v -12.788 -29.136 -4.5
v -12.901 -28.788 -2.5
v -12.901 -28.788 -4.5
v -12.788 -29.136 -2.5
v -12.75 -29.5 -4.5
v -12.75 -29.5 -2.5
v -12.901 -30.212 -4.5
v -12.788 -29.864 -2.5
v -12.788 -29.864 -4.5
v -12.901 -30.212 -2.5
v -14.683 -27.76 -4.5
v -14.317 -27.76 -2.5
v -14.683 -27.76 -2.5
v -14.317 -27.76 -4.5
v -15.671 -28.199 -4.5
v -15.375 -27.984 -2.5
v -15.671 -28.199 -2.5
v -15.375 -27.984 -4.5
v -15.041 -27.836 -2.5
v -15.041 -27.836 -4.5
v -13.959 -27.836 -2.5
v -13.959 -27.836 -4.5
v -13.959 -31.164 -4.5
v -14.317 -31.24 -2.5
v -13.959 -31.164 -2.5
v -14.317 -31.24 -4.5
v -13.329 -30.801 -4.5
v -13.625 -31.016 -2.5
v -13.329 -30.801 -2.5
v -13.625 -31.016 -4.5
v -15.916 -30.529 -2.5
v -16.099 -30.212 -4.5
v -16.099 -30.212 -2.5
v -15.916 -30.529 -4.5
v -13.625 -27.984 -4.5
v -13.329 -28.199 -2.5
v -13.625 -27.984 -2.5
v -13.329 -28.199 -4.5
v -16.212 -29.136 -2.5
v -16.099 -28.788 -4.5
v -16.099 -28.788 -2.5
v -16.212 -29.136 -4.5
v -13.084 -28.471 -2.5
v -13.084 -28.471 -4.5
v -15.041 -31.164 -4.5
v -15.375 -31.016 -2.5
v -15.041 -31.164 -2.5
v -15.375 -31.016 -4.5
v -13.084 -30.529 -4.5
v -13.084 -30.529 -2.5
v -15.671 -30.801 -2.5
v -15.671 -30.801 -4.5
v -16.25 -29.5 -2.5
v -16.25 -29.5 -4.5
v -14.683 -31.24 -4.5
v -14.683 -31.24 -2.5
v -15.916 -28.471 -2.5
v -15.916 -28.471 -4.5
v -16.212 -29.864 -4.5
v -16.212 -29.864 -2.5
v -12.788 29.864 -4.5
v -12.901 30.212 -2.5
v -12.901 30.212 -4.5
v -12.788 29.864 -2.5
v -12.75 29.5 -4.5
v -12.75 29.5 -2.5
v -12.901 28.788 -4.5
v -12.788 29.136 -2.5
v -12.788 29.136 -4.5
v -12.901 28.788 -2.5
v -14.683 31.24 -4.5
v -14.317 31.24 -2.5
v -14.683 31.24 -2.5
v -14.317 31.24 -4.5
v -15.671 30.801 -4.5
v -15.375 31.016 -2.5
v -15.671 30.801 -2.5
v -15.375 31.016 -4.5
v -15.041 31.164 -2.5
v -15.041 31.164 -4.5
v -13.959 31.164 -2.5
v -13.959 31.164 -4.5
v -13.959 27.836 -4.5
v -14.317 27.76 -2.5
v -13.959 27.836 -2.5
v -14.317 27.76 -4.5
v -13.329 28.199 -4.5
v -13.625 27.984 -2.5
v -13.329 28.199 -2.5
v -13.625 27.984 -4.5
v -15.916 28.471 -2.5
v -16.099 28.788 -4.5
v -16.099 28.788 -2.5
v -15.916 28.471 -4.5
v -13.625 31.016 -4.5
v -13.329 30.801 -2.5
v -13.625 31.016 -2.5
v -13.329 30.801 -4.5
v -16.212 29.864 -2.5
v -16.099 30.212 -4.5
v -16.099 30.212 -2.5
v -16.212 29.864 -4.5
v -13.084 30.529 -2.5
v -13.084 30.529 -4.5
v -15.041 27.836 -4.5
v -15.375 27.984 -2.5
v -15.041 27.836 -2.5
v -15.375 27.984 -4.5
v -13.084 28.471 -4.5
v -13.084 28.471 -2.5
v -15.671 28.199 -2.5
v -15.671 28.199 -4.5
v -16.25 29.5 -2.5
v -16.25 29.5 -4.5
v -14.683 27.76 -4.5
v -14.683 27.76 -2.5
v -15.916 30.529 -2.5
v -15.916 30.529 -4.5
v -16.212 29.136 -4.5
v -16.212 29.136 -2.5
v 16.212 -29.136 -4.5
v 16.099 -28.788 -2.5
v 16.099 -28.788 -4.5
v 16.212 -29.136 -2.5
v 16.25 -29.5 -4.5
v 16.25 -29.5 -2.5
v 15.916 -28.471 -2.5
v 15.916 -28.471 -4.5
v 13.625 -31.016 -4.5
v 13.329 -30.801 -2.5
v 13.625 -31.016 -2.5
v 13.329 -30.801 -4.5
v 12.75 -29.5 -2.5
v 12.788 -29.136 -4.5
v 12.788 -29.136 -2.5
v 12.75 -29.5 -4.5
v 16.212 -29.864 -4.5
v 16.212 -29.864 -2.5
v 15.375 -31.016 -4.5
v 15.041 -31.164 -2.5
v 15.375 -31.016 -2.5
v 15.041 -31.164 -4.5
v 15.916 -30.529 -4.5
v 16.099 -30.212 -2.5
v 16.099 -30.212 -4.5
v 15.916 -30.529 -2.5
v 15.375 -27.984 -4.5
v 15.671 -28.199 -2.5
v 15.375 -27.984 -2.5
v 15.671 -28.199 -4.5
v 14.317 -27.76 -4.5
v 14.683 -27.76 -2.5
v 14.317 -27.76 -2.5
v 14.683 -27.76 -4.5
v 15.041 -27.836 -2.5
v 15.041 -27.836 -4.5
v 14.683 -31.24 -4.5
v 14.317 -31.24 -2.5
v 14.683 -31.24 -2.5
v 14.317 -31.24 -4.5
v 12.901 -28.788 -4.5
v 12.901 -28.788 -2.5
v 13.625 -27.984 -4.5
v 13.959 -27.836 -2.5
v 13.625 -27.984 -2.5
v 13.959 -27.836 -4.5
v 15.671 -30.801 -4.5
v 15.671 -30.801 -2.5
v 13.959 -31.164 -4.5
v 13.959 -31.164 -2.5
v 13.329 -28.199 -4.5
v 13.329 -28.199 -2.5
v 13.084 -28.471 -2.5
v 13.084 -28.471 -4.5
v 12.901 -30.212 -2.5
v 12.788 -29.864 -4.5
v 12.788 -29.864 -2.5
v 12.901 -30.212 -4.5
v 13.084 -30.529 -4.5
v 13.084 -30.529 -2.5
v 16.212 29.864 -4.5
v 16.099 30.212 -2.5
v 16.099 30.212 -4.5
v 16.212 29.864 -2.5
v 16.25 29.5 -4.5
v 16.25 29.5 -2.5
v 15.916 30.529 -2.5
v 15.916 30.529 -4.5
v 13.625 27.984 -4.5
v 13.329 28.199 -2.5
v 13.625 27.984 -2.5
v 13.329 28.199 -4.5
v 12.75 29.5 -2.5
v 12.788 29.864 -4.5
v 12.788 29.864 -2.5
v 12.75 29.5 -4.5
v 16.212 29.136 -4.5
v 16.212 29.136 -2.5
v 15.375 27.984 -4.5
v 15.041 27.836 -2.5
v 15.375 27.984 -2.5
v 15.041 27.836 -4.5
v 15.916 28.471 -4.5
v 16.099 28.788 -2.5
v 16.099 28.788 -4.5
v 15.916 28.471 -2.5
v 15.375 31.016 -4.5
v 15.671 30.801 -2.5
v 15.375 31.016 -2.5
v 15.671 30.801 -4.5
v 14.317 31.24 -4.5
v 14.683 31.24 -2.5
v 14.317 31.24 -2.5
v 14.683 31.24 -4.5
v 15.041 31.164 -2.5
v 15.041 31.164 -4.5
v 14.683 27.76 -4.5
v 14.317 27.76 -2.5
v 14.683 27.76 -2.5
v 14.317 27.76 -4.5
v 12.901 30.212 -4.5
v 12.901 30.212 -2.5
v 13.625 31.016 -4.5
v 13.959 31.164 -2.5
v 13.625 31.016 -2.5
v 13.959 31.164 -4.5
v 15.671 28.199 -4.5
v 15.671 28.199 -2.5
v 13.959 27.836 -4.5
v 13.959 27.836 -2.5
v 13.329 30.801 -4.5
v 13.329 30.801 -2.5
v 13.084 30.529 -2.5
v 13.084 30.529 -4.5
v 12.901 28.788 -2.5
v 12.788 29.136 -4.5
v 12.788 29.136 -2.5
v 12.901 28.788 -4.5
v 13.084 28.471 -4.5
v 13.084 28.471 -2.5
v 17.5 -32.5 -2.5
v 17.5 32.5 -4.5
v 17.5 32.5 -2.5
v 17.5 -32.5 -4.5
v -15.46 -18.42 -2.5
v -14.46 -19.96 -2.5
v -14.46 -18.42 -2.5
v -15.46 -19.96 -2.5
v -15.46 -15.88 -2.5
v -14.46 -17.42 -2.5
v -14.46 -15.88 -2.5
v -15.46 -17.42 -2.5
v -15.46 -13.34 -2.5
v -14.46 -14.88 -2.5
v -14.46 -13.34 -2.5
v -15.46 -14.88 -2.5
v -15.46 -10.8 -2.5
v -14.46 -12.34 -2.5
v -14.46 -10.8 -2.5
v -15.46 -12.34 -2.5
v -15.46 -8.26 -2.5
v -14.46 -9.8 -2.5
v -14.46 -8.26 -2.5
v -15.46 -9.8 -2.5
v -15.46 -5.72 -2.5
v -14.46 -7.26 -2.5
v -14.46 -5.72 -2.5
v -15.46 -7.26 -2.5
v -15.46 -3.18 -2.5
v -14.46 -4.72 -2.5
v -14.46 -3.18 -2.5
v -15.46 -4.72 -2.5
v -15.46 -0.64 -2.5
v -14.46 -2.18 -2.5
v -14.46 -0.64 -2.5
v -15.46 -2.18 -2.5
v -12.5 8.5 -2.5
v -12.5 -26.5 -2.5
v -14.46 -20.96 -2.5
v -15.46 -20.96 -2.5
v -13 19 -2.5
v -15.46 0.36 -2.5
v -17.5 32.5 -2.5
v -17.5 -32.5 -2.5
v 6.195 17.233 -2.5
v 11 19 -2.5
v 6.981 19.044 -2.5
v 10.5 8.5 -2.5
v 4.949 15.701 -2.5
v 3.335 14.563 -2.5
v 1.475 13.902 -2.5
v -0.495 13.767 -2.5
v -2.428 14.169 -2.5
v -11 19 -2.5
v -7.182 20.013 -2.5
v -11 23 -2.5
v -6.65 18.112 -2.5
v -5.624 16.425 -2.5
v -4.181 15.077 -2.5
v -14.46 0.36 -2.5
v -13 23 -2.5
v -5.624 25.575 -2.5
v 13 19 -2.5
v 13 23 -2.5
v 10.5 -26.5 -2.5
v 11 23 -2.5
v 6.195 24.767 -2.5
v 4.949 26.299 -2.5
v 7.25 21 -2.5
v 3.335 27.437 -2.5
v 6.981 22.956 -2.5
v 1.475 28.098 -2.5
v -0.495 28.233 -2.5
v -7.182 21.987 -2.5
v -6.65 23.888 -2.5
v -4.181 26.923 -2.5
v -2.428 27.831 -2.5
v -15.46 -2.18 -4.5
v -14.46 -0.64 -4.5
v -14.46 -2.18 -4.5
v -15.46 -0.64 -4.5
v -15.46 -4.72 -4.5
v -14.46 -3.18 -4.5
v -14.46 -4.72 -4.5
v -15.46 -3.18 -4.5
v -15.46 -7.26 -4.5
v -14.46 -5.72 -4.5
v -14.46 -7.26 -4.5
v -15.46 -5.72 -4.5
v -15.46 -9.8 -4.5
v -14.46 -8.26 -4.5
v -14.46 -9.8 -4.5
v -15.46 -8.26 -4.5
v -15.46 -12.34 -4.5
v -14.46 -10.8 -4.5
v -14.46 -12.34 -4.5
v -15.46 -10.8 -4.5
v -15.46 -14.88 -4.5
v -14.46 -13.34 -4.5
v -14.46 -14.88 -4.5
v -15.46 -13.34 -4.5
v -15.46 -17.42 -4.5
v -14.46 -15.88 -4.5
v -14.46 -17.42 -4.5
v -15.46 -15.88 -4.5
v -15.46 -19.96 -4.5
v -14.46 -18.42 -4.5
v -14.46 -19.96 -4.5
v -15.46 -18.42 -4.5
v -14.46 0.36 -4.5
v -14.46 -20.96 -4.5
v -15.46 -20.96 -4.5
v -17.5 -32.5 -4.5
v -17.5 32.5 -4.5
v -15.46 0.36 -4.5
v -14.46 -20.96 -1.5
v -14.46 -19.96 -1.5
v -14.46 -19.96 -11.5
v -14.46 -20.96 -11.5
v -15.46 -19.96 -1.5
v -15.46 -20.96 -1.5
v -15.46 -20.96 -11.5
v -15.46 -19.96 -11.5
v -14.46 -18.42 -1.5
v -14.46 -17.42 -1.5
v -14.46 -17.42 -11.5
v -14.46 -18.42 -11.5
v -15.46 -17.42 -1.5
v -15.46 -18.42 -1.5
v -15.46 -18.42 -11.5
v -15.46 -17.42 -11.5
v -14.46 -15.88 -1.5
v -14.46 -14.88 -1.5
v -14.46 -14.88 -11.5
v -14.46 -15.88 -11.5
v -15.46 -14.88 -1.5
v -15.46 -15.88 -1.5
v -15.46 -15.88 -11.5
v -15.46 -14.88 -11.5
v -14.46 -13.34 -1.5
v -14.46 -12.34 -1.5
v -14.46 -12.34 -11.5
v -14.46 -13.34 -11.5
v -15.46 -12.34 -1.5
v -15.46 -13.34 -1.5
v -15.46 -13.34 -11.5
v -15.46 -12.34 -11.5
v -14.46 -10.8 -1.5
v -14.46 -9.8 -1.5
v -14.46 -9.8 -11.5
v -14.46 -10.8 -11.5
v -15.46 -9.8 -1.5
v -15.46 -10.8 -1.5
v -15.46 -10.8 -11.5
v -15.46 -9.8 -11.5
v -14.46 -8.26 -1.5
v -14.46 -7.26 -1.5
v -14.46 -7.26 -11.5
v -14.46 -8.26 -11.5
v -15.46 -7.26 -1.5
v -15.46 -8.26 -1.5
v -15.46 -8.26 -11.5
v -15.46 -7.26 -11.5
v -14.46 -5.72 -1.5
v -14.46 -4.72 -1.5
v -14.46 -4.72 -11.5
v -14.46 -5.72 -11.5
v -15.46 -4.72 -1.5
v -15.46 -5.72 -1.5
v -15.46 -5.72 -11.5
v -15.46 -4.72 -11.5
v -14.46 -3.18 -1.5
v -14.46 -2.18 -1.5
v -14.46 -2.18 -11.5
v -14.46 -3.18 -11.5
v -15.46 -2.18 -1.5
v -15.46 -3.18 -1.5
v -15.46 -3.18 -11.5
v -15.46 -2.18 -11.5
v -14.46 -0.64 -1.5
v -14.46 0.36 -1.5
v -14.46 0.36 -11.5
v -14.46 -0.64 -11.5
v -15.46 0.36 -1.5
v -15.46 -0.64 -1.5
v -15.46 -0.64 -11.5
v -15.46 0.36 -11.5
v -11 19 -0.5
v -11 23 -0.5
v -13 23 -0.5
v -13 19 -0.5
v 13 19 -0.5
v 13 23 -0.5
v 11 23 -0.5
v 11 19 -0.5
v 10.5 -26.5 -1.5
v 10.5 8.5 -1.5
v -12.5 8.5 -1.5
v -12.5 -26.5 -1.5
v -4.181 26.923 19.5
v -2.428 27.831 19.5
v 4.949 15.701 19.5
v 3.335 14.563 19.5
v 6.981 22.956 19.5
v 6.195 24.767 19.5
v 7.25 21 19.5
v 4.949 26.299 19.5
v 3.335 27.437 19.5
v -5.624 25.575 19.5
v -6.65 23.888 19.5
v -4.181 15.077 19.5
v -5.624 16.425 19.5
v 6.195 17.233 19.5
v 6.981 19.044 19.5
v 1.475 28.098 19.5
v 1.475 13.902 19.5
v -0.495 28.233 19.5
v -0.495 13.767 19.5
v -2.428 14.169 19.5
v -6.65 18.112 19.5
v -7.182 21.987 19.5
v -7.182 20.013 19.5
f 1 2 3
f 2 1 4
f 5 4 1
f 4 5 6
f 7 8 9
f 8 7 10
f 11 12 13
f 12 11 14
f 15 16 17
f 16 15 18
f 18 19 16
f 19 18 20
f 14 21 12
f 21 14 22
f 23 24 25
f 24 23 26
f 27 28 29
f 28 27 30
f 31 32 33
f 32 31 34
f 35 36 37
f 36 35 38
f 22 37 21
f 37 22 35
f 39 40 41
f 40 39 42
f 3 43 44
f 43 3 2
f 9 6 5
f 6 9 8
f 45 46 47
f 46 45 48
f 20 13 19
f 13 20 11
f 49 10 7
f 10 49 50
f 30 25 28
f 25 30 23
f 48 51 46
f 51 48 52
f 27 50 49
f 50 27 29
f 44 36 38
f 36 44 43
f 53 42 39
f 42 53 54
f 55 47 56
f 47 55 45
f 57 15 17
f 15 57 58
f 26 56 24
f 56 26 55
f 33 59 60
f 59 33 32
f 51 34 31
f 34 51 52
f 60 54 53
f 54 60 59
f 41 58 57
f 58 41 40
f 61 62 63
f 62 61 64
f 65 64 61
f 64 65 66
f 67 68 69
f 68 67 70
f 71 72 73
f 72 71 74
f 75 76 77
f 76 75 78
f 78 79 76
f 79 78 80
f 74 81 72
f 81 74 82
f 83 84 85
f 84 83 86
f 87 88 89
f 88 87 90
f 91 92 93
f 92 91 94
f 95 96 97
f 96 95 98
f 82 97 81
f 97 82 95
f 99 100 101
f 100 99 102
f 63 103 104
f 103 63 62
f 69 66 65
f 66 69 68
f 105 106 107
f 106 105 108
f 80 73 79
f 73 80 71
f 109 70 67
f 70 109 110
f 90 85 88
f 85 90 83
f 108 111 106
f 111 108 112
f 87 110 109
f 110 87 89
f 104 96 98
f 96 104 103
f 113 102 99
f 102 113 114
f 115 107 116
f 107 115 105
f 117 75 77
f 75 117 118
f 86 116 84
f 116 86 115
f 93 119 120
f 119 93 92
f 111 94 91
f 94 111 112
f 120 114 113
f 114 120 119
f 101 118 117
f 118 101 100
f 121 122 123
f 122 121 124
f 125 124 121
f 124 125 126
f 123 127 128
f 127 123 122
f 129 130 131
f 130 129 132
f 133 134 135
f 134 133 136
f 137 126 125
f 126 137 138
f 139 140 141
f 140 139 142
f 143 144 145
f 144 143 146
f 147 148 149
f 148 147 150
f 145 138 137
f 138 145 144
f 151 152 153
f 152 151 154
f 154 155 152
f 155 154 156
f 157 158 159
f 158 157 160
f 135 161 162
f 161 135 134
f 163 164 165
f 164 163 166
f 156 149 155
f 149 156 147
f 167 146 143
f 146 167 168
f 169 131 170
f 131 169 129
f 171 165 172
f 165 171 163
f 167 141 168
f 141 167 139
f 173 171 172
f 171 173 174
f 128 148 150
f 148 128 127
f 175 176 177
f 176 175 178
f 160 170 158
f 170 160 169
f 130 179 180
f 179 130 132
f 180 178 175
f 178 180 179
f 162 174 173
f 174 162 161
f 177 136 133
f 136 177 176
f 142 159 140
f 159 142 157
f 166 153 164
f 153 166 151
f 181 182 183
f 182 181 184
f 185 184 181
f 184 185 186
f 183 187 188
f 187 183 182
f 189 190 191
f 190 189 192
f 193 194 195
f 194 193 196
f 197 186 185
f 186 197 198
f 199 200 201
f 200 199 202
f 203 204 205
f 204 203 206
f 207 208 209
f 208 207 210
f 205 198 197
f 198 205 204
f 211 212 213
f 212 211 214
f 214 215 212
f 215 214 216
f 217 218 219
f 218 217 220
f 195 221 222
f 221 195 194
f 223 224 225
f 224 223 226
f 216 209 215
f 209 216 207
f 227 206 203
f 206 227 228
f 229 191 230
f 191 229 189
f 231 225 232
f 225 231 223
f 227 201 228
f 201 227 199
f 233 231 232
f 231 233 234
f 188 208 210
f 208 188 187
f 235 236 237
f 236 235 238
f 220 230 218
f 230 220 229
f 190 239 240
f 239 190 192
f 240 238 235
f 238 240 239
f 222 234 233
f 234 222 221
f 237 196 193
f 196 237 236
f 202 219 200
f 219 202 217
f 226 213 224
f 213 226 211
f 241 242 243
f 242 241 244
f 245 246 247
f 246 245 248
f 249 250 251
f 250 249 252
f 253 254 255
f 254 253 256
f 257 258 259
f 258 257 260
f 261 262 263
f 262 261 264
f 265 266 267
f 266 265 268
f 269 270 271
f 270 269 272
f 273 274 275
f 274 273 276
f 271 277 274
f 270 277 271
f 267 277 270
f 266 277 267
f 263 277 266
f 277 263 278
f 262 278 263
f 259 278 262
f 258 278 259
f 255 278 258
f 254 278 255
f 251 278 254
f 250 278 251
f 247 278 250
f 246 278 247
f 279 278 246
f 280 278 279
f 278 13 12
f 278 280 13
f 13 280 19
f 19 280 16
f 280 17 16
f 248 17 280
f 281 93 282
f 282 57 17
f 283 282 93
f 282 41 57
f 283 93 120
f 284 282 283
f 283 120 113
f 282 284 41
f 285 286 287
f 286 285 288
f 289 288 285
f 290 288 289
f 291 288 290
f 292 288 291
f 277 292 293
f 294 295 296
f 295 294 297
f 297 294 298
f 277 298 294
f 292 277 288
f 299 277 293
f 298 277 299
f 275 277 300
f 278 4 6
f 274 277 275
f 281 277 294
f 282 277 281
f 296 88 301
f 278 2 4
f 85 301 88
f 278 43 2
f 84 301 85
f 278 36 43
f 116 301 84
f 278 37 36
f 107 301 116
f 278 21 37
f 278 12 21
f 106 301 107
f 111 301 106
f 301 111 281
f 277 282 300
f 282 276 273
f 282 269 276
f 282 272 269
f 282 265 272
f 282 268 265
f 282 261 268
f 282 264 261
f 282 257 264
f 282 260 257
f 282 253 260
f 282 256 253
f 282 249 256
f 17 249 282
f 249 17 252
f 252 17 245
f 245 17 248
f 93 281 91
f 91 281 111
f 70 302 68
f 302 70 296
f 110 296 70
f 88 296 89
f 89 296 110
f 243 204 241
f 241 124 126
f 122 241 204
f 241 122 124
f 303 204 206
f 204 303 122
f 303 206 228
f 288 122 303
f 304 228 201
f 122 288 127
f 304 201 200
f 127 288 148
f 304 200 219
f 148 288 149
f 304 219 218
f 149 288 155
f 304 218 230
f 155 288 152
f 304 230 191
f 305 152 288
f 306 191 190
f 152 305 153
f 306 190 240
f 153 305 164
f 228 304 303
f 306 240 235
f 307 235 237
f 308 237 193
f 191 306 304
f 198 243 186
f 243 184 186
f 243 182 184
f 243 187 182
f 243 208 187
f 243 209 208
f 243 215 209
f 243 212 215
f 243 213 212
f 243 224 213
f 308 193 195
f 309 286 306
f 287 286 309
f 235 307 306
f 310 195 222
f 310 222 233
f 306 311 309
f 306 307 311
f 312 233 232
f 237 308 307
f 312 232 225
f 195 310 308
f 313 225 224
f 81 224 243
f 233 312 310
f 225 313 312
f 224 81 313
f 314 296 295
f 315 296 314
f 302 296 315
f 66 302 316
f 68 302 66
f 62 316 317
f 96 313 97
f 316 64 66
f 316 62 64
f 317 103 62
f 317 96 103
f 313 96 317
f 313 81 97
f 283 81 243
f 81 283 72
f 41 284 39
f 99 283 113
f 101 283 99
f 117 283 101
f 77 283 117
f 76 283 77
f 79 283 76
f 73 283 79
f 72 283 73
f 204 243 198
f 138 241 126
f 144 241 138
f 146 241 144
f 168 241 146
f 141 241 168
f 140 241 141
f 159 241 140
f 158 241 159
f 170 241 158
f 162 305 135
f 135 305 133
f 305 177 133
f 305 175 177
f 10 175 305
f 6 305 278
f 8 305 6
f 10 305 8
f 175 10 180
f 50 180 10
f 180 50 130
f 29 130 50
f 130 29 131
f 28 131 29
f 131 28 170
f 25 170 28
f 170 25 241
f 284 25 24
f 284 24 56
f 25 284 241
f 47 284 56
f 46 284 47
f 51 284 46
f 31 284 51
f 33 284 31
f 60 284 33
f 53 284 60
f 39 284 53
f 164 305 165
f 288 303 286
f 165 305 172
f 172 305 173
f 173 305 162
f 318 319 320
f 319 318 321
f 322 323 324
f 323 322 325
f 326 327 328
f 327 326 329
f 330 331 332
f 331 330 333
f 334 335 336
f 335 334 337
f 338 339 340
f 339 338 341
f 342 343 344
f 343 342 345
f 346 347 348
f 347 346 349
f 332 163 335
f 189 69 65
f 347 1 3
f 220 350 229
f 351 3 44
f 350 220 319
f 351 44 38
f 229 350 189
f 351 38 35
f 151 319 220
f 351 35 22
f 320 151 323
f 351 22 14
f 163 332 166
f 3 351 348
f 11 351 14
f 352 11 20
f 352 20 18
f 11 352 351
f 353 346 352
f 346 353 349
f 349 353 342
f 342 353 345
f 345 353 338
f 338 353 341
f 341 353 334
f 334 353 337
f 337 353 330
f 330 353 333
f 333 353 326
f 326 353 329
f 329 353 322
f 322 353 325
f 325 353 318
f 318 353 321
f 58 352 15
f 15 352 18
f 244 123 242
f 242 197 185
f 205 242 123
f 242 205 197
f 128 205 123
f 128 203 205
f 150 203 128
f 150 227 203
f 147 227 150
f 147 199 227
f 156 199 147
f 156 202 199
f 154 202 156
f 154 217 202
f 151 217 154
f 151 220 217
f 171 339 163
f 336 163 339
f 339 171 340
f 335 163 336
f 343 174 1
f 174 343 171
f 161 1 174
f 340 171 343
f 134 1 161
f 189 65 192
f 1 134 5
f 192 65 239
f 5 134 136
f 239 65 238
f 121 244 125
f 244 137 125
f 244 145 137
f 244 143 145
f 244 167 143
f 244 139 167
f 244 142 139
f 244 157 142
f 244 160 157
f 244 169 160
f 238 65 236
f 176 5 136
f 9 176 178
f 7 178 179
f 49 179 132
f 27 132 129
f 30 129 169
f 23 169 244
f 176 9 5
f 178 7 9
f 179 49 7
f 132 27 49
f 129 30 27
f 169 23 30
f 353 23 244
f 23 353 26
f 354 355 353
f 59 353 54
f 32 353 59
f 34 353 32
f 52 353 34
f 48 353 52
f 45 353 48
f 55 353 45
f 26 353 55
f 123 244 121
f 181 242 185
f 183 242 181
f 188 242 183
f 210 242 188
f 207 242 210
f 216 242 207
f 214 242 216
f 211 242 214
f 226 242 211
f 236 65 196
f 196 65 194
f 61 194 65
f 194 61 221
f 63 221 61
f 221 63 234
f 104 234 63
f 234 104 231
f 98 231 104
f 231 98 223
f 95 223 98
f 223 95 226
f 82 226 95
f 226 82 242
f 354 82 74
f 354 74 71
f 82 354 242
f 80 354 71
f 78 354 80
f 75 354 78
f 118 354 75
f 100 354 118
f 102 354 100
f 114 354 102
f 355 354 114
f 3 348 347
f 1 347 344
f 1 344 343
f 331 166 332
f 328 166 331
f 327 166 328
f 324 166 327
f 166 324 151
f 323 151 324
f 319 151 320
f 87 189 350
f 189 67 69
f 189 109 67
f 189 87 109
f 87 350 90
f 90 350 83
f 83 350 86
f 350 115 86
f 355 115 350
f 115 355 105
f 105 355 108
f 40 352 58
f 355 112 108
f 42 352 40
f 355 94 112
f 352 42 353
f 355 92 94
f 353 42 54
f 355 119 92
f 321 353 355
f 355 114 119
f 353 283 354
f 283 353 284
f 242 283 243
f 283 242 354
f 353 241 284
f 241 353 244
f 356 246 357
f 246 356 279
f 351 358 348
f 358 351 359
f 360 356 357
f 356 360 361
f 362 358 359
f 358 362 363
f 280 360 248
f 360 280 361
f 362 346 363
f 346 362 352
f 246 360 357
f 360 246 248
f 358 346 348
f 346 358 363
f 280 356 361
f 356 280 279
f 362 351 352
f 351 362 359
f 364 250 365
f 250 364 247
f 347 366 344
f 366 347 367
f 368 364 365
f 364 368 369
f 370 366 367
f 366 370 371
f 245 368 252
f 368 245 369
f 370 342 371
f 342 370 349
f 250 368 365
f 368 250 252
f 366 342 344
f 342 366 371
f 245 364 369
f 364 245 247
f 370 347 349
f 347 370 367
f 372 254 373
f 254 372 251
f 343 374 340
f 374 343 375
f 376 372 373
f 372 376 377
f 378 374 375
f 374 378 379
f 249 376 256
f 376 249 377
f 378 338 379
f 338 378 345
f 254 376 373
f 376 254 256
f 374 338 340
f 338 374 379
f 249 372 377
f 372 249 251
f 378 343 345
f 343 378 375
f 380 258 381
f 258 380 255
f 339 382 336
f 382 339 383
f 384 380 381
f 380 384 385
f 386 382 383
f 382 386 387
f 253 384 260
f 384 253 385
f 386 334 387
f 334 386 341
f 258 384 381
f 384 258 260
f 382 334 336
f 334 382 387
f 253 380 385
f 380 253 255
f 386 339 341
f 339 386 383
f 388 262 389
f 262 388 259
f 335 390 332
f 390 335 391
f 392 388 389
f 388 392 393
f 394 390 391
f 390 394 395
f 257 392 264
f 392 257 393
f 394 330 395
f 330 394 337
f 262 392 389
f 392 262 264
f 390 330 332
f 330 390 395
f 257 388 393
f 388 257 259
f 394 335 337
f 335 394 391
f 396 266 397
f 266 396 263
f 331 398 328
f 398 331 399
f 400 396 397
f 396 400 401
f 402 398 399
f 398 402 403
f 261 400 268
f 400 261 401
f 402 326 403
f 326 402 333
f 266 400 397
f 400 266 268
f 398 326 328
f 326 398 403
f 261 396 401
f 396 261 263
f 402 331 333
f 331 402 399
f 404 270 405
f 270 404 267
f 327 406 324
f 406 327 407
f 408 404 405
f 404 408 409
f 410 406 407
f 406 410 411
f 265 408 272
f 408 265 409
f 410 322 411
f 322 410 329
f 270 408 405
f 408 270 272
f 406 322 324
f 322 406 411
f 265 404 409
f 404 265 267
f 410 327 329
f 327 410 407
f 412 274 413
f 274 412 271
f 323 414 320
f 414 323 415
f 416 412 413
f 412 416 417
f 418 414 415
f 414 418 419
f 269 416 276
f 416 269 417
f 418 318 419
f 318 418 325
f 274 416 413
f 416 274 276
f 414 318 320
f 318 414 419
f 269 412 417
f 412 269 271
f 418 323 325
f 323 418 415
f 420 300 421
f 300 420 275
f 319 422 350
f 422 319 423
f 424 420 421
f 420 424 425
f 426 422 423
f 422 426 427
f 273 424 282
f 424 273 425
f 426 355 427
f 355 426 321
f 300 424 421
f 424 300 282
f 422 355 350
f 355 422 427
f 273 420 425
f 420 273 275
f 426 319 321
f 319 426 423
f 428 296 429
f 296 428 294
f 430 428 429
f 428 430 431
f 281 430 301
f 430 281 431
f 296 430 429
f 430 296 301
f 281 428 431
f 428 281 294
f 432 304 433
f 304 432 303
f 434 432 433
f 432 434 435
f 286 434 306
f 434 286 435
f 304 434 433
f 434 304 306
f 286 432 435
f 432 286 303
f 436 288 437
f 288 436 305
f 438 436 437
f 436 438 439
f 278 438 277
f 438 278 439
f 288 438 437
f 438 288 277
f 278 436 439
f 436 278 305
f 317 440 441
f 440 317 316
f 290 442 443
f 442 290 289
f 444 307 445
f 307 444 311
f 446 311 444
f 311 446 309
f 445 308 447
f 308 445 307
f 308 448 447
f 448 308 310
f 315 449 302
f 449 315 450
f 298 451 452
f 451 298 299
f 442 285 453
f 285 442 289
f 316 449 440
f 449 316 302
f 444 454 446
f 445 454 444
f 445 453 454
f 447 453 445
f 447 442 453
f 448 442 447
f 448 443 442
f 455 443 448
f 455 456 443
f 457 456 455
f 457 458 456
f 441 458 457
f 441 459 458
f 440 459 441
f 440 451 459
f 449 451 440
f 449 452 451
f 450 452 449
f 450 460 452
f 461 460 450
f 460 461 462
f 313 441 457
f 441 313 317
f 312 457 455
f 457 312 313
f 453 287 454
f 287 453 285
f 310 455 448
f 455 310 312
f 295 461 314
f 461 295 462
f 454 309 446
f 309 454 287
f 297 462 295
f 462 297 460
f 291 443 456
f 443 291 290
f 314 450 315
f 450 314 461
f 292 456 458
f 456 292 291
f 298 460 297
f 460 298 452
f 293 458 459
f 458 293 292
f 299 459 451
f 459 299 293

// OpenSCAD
board_w = 35;
board_l = 65;
board_h = 2;
hole_offset = 3;
hole_d = 3.5;

screen_w = 23;
screen_l = 35;
screen_h = 1;
screen_offset_l = 5;
screen_offset_w = 6;

knob_d = 14.5;
knob_h = 22;
knob_offset_l = 52.5 - board_l/2+1;
knob_offset_w = 0;

module screen(){
  color("black")
    translate([-board_w/2+screen_offset_l,
	       -board_l/2+screen_offset_w, 0])
    cube([screen_w, screen_l, screen_h]);
}

module screen_hole(){
    translate([-board_w/2+screen_offset_l-1,
	       -board_l/2+screen_offset_w-1, -5])
    cube([screen_w+2, screen_l+2, screen_h+10]);
}
inch = 25.4;
module pins(){
  translate([-board_w/2+.1*inch, -board_l/2 + .474*inch, -6]){
    for(i=[0:8]){
      translate([0, i * .1 * inch, 2])cube([1, 1, 10],center=true);
    }
    //translate([0,-9,0])cylinder(d=3.5, h=10, $fn=30);
  }
}
module knob(){
  translate([knob_offset_w, knob_offset_l, 0])color("darkgrey")cylinder(d=knob_d, h=knob_h);
}

module knob_hole(){
  translate([knob_offset_w, knob_offset_l, -5])rotate([0,0,45])
    cylinder(d=knob_d+4, h=knob_h+10, $fn=40);
}

module display_board(){
  difference(){
    color("darkblue")translate([0,0,-board_h/2])cube([board_w, board_l, board_h], center=true);
    for(i=[-1,1]){
      for(j=[-1,1]){
	translate([i * (board_w/2 - hole_offset), j * (board_l/2 - hole_offset), 0])
	  cylinder(d=hole_d, h=10, center=true, $fn=30);
      }
    }
  }
}

module button(){
  translate([0,0,1])cube([2, 4, 2], center=true);
}
module buttons(){
  translate([knob_offset_w-12, knob_offset_l, 0])color("lightgrey")button();
  translate([knob_offset_w+12, knob_offset_l, 0])color("lightgrey")button();
}

module display_assy(){
  translate([0,0,-2.5]){
    display_board();
    screen();
    knob();
    pins();
    buttons();
  }
}

module display_screws(){
  for(i=[-1,1]){
    for(j=[-1,1]){
      translate([i * (board_w/2 - hole_offset), j * (board_l/2 - hole_offset), 0])
	cylinder(d=hole_d, h=30, center=true, $fn=30);
    }
  }
}

module display_spacer(){
  $fn=30;
  difference(){
    cylinder(d=8, h=2.5);
    translate([0,0,-1])cylinder(d=3.5, h=2.5+2);
  }
}
module display_spacers(){
  translate([0,0,-2.5])
  for(i=[-1,1]){
    for(j=[-1,1]){
      translate([i * (board_w/2 - hole_offset), j * (board_l/2 - hole_offset), 0])display_spacer();
    }
  }
}
//display_spacers();
//buttons();
display_assy();
//translate([0,0,0])screen_hole();
